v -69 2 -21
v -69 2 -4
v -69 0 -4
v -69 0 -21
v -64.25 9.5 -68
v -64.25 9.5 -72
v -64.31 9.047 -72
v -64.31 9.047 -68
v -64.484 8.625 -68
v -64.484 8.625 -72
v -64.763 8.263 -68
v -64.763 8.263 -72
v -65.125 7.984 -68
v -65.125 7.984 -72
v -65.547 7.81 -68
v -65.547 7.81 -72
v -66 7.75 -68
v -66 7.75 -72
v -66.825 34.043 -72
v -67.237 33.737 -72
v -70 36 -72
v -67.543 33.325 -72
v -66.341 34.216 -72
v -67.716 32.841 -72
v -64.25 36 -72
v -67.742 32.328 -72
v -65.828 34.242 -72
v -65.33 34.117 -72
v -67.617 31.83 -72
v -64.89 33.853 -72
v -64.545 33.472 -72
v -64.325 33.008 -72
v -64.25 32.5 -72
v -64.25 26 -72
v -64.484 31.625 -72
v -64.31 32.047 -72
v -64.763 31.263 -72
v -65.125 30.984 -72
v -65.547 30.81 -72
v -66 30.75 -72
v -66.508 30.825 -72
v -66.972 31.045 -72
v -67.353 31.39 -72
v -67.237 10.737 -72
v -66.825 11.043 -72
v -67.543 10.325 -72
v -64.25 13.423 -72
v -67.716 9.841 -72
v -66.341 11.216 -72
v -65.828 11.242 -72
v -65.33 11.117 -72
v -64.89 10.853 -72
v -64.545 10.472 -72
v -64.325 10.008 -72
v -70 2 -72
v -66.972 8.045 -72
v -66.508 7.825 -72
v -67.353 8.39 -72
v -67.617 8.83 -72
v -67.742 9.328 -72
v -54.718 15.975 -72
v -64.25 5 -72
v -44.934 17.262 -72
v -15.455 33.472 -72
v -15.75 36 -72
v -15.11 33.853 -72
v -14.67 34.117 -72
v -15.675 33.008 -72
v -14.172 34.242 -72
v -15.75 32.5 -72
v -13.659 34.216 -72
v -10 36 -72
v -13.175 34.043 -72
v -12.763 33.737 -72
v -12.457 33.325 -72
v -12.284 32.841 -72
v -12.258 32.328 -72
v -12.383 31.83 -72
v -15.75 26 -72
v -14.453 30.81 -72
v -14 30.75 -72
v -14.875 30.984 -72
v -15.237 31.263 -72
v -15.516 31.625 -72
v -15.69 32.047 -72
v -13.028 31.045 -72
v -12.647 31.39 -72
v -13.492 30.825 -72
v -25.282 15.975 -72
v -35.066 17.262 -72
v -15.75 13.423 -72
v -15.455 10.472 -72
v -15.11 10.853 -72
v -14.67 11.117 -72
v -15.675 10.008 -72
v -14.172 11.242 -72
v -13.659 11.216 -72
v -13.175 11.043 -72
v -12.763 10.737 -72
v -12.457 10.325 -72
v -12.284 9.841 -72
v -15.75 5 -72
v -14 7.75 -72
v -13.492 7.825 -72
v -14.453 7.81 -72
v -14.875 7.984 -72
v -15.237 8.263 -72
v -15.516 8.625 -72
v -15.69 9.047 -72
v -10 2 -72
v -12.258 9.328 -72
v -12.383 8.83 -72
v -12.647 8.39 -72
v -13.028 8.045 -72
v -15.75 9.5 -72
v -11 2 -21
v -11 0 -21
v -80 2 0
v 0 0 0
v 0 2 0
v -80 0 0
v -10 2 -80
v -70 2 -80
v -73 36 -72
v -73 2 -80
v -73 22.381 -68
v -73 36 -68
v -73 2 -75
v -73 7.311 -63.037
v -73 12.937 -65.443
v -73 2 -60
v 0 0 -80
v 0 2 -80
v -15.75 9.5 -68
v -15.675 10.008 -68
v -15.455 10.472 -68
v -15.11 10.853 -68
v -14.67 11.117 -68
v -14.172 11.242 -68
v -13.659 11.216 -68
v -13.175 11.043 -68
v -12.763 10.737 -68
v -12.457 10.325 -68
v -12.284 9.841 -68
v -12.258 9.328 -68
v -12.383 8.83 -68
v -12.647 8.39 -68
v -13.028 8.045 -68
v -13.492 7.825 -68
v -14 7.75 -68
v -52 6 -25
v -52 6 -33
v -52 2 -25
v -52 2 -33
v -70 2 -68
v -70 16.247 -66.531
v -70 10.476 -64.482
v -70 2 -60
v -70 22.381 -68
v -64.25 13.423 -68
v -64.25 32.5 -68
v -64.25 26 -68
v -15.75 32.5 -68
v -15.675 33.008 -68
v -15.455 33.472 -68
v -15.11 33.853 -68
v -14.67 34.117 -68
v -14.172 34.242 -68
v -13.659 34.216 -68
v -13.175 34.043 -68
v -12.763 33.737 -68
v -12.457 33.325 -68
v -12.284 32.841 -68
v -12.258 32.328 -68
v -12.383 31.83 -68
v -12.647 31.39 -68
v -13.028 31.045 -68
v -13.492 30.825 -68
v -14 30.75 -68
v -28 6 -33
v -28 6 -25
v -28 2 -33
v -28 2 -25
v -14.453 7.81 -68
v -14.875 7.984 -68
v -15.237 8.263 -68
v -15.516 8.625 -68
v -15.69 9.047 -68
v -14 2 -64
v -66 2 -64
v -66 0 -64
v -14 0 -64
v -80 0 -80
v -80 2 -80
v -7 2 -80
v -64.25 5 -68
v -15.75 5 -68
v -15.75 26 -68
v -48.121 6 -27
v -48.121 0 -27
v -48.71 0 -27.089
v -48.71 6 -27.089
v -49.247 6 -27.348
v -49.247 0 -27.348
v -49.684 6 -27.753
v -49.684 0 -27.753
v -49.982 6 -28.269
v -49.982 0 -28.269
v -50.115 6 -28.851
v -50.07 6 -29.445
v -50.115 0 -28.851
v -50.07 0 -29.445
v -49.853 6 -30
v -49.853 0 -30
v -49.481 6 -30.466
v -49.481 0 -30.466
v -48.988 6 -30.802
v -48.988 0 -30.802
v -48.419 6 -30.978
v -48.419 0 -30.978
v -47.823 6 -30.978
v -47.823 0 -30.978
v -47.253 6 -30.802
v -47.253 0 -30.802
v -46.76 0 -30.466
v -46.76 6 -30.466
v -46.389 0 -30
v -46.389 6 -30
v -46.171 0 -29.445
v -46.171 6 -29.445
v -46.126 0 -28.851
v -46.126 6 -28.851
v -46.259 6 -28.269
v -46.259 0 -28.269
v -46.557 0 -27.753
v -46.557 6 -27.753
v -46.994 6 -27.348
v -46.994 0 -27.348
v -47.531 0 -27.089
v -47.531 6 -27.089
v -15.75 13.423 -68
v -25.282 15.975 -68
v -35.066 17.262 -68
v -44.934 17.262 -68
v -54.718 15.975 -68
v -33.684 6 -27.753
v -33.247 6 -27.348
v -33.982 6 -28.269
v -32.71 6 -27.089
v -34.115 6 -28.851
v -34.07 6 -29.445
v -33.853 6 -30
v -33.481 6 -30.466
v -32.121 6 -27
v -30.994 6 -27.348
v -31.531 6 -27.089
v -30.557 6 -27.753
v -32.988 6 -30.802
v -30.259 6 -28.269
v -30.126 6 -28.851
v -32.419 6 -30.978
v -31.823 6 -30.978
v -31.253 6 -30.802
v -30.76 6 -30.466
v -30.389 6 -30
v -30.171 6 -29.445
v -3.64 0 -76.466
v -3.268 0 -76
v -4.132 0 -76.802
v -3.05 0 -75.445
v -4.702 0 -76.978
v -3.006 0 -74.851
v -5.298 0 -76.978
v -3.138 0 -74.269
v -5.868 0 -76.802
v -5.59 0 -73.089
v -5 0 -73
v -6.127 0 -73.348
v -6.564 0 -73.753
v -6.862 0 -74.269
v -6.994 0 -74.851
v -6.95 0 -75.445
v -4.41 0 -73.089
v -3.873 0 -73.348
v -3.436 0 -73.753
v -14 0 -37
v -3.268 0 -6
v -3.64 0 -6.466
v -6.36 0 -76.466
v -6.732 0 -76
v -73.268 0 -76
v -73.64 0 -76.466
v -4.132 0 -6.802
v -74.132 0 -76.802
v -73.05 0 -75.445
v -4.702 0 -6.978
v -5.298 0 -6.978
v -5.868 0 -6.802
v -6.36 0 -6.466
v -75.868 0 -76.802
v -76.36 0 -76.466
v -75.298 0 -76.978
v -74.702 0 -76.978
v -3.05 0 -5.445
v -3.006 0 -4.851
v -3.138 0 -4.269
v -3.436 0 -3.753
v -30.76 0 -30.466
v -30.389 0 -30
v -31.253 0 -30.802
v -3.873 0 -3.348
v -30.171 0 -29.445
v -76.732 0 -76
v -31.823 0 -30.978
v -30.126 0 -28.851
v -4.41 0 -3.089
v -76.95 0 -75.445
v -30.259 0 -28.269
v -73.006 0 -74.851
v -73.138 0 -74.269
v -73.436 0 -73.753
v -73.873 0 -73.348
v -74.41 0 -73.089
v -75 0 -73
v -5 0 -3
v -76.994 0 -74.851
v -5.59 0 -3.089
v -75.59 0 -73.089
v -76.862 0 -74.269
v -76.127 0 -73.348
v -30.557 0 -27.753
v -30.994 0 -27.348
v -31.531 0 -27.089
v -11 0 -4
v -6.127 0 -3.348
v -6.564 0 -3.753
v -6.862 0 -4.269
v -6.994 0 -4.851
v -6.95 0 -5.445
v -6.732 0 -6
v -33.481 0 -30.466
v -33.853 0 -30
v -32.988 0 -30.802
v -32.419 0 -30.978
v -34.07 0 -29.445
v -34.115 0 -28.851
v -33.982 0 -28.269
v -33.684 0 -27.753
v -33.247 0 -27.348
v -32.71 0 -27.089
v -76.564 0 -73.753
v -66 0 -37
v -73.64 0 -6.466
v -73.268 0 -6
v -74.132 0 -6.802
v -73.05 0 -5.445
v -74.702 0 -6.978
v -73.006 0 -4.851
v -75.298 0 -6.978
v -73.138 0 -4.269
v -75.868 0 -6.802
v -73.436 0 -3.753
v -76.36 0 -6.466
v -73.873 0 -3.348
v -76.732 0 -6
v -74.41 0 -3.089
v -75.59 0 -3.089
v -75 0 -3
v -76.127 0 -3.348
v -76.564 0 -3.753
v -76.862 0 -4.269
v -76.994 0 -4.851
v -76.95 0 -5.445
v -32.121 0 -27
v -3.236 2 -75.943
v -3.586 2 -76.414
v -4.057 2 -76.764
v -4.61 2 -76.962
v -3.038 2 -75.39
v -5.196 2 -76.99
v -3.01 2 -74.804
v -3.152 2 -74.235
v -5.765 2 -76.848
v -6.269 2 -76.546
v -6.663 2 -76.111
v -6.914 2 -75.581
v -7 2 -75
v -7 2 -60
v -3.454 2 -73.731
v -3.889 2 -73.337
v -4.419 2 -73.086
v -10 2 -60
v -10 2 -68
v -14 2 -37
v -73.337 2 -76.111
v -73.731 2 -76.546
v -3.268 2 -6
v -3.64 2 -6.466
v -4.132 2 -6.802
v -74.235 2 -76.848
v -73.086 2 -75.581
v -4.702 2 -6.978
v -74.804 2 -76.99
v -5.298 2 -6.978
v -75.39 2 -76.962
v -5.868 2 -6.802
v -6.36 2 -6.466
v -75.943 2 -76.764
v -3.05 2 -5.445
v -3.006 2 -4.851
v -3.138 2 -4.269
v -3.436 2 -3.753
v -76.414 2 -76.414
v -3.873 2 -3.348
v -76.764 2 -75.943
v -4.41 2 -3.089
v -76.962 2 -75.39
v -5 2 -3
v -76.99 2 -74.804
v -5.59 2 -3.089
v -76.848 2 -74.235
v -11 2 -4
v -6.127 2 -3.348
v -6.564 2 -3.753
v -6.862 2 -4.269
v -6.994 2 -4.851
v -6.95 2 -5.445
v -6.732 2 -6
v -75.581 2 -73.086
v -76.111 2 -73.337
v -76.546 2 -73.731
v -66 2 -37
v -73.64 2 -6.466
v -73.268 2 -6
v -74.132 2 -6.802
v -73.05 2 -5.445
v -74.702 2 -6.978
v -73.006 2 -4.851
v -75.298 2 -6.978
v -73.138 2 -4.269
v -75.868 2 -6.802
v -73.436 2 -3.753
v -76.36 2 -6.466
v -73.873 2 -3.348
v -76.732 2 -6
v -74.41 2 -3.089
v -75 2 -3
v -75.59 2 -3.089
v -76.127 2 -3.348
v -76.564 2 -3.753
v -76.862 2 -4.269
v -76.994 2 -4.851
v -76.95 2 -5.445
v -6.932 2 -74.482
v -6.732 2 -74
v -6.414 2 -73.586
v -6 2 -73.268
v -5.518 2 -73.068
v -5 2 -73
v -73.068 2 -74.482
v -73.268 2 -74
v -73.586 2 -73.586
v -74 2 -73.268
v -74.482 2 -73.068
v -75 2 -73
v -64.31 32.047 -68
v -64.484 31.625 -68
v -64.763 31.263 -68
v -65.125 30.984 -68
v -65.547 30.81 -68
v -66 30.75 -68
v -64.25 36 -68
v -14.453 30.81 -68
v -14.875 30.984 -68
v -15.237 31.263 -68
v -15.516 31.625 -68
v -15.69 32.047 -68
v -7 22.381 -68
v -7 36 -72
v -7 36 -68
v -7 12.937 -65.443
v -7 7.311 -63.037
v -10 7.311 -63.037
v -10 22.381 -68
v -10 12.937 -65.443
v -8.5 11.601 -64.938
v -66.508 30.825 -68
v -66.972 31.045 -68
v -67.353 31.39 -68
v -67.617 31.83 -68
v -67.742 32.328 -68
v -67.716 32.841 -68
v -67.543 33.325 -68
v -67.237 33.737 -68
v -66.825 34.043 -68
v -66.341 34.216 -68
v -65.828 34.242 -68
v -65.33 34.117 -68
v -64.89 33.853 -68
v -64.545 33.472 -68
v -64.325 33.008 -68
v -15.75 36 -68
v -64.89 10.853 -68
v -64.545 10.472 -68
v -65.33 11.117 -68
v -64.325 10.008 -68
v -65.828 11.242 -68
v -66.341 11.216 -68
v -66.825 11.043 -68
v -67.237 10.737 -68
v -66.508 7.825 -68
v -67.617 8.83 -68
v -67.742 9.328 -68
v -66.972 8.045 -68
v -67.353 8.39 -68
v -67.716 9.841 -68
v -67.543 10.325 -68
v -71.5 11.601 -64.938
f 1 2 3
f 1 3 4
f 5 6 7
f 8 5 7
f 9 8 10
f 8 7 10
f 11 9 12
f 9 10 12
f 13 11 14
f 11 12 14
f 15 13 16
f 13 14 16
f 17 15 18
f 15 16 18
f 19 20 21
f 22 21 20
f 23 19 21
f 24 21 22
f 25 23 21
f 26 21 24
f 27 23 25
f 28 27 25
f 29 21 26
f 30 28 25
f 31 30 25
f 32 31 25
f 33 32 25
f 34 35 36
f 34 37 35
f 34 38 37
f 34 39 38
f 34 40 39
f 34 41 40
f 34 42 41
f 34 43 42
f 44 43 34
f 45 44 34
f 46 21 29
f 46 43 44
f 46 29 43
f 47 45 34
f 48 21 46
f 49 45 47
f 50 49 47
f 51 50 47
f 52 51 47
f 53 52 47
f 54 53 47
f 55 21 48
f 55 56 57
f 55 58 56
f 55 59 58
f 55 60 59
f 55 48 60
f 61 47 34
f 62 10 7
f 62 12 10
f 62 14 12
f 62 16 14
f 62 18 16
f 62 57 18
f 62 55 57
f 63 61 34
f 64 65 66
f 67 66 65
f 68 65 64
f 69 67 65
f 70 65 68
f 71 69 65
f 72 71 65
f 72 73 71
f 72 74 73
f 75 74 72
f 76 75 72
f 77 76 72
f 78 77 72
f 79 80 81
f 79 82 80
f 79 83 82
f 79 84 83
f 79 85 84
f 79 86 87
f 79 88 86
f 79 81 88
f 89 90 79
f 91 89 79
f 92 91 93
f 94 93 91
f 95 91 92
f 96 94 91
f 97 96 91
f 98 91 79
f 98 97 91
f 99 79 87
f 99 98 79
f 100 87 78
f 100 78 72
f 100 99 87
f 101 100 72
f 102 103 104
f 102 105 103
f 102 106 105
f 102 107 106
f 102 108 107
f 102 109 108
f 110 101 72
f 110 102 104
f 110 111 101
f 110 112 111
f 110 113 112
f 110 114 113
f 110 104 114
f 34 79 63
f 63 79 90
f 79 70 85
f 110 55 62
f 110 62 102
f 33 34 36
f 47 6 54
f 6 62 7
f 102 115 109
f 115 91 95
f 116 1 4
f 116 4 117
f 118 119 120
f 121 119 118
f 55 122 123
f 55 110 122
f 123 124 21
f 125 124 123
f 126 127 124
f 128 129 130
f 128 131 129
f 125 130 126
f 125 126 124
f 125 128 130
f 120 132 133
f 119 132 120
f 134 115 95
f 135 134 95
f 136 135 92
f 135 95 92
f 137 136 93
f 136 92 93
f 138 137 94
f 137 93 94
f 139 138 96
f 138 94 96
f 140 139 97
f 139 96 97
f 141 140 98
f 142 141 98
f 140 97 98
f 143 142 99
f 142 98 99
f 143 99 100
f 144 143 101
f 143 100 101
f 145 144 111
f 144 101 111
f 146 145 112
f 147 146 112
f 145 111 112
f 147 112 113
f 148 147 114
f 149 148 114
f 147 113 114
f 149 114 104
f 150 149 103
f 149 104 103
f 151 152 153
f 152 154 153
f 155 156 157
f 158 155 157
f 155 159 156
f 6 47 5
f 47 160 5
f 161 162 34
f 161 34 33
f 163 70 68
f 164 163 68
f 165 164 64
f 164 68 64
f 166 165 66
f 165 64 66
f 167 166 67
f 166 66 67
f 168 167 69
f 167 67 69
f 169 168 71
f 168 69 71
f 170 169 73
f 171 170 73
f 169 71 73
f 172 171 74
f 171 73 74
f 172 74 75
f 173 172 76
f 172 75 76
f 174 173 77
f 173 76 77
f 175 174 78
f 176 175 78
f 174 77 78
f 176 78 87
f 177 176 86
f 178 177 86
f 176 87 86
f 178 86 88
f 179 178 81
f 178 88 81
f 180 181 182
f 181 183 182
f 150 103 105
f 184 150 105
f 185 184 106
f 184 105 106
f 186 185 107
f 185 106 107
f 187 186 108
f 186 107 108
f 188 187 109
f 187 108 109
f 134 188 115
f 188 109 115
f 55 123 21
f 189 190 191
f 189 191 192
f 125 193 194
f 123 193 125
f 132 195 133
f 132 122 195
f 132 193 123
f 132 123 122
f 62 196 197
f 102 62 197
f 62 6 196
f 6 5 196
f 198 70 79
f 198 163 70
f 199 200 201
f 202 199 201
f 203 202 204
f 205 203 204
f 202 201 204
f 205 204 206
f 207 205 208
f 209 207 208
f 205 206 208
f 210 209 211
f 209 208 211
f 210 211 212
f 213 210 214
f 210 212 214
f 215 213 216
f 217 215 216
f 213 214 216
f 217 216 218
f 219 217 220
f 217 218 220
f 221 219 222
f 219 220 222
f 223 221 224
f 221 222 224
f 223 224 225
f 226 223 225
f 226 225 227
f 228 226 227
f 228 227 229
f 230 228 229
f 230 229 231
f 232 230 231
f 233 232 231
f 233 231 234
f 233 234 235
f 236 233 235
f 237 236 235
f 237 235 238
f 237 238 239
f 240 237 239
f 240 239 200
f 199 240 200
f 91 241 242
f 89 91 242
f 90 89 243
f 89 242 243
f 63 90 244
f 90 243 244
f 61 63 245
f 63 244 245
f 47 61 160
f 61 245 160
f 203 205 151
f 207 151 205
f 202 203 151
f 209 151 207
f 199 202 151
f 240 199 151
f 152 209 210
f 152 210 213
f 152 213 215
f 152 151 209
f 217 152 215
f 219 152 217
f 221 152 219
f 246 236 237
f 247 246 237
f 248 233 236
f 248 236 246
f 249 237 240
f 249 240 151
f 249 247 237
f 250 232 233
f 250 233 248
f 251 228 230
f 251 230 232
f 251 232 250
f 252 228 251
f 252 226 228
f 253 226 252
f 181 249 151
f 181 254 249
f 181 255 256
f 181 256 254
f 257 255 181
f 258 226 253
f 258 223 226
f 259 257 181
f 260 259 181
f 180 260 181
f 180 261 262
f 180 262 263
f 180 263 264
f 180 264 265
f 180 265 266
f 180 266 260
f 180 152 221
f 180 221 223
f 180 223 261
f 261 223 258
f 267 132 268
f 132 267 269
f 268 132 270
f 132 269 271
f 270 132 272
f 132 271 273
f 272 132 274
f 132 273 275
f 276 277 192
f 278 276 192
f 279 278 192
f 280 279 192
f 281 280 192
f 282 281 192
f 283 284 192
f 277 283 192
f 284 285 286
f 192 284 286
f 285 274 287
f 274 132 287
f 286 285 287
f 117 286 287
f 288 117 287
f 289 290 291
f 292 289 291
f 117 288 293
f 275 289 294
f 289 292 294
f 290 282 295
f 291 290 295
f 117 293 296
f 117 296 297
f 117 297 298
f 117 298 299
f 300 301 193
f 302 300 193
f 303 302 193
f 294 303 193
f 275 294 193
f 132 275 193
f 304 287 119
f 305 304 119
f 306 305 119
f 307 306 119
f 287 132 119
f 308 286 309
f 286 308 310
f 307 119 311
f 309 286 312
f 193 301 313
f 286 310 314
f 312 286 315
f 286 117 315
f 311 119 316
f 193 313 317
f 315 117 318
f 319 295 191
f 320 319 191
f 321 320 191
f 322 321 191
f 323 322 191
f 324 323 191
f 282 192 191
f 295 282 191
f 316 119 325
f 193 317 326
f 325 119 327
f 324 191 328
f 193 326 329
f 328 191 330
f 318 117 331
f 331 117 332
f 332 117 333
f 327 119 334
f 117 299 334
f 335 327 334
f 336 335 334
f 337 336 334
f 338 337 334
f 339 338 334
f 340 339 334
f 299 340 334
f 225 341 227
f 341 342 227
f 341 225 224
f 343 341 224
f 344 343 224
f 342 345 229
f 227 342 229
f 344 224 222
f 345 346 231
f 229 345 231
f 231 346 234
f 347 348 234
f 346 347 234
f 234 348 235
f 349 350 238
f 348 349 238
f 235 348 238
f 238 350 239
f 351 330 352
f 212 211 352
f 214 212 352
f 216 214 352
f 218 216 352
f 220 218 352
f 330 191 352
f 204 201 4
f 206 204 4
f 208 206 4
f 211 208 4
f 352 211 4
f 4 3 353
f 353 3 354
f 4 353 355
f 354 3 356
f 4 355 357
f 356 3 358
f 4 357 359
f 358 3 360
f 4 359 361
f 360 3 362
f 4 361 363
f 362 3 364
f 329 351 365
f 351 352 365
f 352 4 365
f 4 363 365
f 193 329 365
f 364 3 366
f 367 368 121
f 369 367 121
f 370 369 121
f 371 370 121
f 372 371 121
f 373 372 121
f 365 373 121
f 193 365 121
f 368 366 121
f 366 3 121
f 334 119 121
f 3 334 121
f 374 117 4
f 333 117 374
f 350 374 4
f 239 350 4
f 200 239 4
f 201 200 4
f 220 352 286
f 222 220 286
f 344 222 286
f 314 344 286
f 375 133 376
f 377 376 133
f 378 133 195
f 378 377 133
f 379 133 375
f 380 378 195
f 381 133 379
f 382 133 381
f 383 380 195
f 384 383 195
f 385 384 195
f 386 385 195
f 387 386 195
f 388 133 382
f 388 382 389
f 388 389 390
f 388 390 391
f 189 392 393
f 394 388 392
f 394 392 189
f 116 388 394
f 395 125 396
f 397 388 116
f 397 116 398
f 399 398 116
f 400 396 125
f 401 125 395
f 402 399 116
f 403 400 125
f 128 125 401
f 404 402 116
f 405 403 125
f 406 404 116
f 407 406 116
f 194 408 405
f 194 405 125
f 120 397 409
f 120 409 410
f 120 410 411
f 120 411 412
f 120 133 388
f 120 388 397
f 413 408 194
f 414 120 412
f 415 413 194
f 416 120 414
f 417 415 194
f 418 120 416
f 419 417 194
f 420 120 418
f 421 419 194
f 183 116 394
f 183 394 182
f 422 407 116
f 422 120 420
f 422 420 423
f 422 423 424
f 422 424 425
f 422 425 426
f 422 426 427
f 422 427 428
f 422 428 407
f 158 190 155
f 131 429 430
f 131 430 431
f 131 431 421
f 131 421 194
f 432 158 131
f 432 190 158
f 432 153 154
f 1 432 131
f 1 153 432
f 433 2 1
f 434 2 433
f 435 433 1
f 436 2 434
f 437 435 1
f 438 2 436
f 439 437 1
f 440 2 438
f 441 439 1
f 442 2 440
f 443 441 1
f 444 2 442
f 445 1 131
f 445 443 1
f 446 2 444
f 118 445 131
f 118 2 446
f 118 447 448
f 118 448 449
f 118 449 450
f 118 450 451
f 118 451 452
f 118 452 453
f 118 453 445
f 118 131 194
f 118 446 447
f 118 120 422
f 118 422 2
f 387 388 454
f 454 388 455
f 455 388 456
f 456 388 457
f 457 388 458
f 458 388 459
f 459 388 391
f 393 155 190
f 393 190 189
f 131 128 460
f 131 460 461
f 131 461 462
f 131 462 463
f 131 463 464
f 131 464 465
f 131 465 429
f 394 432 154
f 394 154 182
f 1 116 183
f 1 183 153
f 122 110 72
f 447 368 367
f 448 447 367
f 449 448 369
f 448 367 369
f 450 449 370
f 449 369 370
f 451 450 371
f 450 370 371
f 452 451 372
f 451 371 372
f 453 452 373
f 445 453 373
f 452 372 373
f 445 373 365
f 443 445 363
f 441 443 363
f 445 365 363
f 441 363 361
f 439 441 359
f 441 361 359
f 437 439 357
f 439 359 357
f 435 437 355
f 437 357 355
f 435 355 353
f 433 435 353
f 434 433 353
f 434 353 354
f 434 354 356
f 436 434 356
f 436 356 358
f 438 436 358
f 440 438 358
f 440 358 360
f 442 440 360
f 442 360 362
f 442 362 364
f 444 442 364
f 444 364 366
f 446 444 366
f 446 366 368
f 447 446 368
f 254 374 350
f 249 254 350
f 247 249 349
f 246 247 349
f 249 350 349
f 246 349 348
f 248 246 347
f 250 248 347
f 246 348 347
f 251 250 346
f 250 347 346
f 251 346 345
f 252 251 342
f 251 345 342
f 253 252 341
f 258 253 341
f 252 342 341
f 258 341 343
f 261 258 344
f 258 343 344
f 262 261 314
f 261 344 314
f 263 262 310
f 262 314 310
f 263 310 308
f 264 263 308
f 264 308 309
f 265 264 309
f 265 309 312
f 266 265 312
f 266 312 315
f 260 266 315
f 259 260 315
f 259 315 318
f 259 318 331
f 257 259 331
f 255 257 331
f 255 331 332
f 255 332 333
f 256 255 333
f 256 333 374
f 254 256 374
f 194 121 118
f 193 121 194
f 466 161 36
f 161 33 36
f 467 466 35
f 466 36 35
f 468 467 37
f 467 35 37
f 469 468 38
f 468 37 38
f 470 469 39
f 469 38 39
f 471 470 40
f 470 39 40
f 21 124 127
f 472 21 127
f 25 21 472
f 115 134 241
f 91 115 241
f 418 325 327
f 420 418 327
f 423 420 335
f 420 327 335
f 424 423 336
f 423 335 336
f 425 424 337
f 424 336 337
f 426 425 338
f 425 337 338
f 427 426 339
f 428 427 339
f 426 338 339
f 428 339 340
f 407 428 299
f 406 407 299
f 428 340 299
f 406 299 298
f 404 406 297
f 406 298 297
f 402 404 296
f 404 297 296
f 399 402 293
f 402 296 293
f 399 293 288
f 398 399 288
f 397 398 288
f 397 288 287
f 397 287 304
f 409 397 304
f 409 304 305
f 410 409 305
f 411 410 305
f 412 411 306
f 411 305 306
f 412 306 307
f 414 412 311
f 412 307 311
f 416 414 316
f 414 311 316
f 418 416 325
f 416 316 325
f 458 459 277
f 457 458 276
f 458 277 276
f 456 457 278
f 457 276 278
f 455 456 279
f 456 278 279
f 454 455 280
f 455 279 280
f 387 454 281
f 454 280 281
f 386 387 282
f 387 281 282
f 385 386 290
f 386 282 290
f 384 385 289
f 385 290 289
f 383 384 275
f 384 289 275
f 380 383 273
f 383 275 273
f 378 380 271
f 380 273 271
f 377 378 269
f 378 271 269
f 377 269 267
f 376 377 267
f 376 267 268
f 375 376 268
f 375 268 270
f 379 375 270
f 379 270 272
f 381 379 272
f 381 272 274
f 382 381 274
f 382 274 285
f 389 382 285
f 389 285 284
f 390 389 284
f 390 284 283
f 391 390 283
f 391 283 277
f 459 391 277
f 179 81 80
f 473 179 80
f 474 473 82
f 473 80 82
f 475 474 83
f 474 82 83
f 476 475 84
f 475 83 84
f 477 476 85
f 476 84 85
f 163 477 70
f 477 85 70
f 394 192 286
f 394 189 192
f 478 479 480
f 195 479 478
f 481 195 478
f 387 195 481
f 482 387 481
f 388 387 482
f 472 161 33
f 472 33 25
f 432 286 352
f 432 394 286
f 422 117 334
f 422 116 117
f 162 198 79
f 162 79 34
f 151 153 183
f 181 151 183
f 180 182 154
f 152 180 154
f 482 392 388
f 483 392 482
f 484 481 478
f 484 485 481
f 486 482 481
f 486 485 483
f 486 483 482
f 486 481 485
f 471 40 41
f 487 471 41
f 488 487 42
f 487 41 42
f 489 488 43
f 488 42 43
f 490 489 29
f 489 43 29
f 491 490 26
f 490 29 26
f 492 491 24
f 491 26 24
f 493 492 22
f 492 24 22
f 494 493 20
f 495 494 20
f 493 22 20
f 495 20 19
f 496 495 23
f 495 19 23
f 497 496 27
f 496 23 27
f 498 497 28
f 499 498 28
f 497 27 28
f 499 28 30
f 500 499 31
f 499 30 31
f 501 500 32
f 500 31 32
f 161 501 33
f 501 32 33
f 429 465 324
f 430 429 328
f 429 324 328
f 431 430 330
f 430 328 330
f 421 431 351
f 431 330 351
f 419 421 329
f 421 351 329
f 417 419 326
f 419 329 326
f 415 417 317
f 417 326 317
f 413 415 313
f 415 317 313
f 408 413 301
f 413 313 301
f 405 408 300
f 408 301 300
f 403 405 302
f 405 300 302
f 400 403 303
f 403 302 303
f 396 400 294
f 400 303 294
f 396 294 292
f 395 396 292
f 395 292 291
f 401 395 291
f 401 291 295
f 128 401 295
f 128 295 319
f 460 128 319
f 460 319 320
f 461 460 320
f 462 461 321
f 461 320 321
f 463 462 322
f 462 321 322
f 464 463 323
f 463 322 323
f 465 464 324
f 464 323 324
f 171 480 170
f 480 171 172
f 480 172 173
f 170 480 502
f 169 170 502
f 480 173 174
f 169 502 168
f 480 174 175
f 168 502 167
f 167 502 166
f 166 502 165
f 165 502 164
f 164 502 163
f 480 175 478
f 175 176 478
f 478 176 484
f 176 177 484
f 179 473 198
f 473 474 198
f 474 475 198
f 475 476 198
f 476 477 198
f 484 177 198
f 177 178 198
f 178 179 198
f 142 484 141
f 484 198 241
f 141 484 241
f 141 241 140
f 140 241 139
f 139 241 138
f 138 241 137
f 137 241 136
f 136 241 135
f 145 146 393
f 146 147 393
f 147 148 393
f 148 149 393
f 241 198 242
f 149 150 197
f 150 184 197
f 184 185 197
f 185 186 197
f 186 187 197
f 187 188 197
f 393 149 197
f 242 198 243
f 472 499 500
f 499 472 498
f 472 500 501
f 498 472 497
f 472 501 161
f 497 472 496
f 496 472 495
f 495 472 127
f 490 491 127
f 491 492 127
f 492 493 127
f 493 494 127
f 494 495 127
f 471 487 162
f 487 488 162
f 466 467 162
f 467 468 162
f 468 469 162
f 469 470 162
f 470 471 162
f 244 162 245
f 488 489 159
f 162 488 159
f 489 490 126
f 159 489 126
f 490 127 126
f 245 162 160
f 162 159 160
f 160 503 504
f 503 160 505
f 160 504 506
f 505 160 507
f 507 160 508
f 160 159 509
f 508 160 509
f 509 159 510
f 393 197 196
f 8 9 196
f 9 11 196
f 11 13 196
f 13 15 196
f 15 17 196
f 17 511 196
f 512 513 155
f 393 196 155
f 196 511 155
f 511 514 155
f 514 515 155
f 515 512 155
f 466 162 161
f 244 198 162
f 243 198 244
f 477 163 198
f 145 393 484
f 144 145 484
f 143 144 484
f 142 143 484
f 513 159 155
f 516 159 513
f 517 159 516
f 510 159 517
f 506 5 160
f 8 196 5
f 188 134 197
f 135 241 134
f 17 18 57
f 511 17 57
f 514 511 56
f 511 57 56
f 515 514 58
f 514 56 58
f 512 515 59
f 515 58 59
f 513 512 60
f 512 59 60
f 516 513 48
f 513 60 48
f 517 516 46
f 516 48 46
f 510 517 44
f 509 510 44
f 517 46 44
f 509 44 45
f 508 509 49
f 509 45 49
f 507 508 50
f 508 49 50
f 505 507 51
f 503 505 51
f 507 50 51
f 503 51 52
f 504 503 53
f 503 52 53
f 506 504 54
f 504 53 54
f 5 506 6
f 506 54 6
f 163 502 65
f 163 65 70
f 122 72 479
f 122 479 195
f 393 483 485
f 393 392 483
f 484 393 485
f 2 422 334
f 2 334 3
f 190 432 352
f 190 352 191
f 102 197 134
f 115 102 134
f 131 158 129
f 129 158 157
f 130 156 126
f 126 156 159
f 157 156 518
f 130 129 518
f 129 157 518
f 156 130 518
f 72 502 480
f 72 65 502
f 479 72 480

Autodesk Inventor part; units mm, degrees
ref_plane "YZ Plane" through (0, 0, 0) normal (1, 0, 0) x (0, 1, 0)
ref_plane "XZ Plane" through (0, 0, 0) normal (0, 1, 0) x (-1, 0, 0)
ref_plane "XY Plane" through (0, 0, 0) normal (0, 0, 1) x (1, 0, 0)
sketch "Sketch1" plane through (0, 0, 0) normal (0, 1, 0) x (-1, 0, 0)
  line L0 (0, 0) -> (80, 0)
  line L1 (80, 0) -> (80, -80)
  line L2 (80, -80) -> (0, -80)
  line L3 (0, -80) -> (0, 0)
  line L4 (63.0847, -18.93) -> (13.0847, -18.93) construction
  line L5 (13.0847, -18.93) -> (13.0847, -23.93) construction
  line L6 (13.0847, -23.93) -> (63.0847, -23.93) construction
  line L7 (63.0847, -23.93) -> (63.0847, -18.93) construction
  line L8 (63.0847, -42.93) -> (13.0847, -42.93) construction
  line L9 (13.0847, -42.93) -> (13.0847, -47.93) construction
  line L10 (13.0847, -47.93) -> (63.0847, -47.93) construction
  line L11 (63.0847, -47.93) -> (63.0847, -42.93) construction
  line L12 (51.4414, -53.454) -> (27.4414, -53.454) construction
  line L13 (27.4414, -53.454) -> (27.4414, -61.454) construction
  line L14 (27.4414, -61.454) -> (51.4414, -61.454) construction
  line L15 (51.4414, -61.454) -> (51.4414, -53.454) construction
  circle A0 centre (48.4614, -57.454) radius 2 construction
  circle A1 centre (30.4614, -57.454) radius 2 construction
  dimension "d0" = 80
  dimension "d1" = 80
  dimension "d2" = 24
  dimension "d3" = 8
  dimension "d4" = 4
  dimension "d5" = 18
  dimension "d6" = 2.98
  dimension "d7" = 4
  dimension "d8" = 3.02
  dimension "d9" = 50
  dimension "d10" = 5
  dimension "d11" = 19
extrude "Extrusion1" add sketch "Sketch1" along normal blind 2
sketch "Sketch3" plane through (0, 2, 0) normal (0, 1, 0) x (1, 0, 0)
  circle A0 centre (-48.98, 29) radius 2 construction
  circle A1 centre (-30.98, 29) radius 2 construction
  line L0 (-28, 33) -> (-52, 33)
  line L1 (-52, 25) -> (-28, 25)
  line L2 (-28, 25) -> (-28, 33)
  line L3 (-52, 33) -> (-52, 25)
  line L4 (-80, 80) -> (-80, 0) construction
  line L5 (-80, 40) -> (0, 40) construction
  line L6 (0, 0) -> (0, 80) construction
  line L7 (0, 80) -> (-80, 80) construction
  line L8 (-40, 80) -> (-40, 0) construction
  line L9 (-80, 0) -> (0, 0) construction
  point P0 (-40, 33)
  dimension "d29" = 24
  dimension "d30" = 8
  dimension "d31" = 4
  dimension "d32" = 18
  dimension "d33" = 2.98
  dimension "d34" = 4
  dimension "d35" = 3.02
  dimension "d128" = 15
extrude "Extrusion3" add sketch "Sketch3" along normal blind 4
sketch "Sketch4" plane through (0, 2, 0) normal (0, 1, 0) x (1, 0, 0)
  point P0 (0, 0)
sketch "Sketch7" plane through (0, 2, 0) normal (0, 1, 0) x (1, 0, 0)
  line L0 (-5, 5) -> (-75, 5)
  line L1 (-75, 5) -> (-75, 75)
  line L2 (-75, 75) -> (-5, 75)
  line L3 (-5, 75) -> (-5, 5)
  line L4 (-80, 0) -> (0, 0) projected
  line L5 (0, 0) -> (0, 80) projected
  line L6 (-80, 80) -> (-80, 0) projected
  line L7 (0, 80) -> (-80, 80) projected
  dimension "d49" = 5
  dimension "d50" = 5
  dimension "d51" = 5
  dimension "d52" = 5
hole "Hole2" at (-5, 2, -5) at (-5, 2, -75) at (-75, 2, -75) at (-75, 2, -5) direction (0, -1, 0) diameter 4 end through all
sketch "Sketch10" plane through (0, 6, 0) normal (0, 1, 0) x (1, 0, 0)
  line L0 (-52, 33) -> (-52, 25) projected
  line L1 (-52, 29) -> (-29.1848, 29)
  point P0 (0, 0)
  point P1 (-48.1206, 29)
  point P2 (-32.1206, 29)
  dimension "d81" = 16
hole "Hole3" at (-48.1206, 6, -29) at (-32.1206, 6, -29) direction (0, -1, 0) diameter 4 end through all
sketch "Sketch20" plane through (0, 2, 0) normal (0, 1, 0) x (1, 0, 0)
  line L0 (-73, 80) -> (-70, 80) construction
  line L1 (-70, 60) -> (-73, 60) construction
  line L2 (-73, 60) -> (-73, 80) construction
  line L3 (-10, 60) -> (-7, 60) construction
  line L4 (-7, 60) -> (-7, 80) construction
  line L5 (-7, 80) -> (-10, 80) construction
  line L6 (-70, 60) -> (-73, 60)
  line L7 (-73, 60) -> (-73, 80)
  line L8 (-73, 80) -> (-70, 80)
  line L9 (-70, 80) -> (-70, 72)
  line L10 (-70, 72) -> (-10, 72)
  line L11 (-10, 72) -> (-10, 80)
  line L12 (-10, 80) -> (-7, 80)
  line L13 (-7, 80) -> (-7, 60)
  line L14 (-7, 60) -> (-10, 60)
  line L15 (-10, 60) -> (-10, 68)
  line L16 (-10, 68) -> (-70, 68)
  line L17 (-70, 68) -> (-70, 60)
  line L18 (-70, 60) -> (-73, 60)
  point P0 (0, 0)
  dimension "d132" = 3
  dimension "d133" = 20
extrude "Extrusion13" add sketch "Sketch20" along normal blind 34
sketch "Sketch21" plane through (-70, 2, -60) normal (1, 0, 0) x (0, 0, -1)
  line L0 (8, 0) -> (0, 0) construction
  line L1 (0, 0) -> (5.8768, 9.0116) construction
  line L2 (8, 0) -> (8, 34) construction
  line L3 (5.8768, 9.0116) -> (8, 20.3813) construction
  spline S0 degree 2 poles (0, 0) (5.8768, 9.0116) (8, 20.3813) knots 1 1 1 2 2 2
  line L4 (0, 0) -> (0, 34) projected
  line L5 (0, 0) -> (0, 34)
  line L6 (0, 34) -> (8, 34) projected
  line L7 (0, 34) -> (8, 34)
  line L8 (8, 34) -> (8, 20.3813)
  point P0 (-60, -2)
extrude "Extrusion14" cut sketch "Sketch21" along normal through all both and the other way through all
sketch "Sketch22" plane through (-70, 2, -72) normal (1, 0, 0) x (0, 0, -1)
  line L0 (0, 34) -> (8, 0)
  line L1 (8, 0) -> (8, 34)
  line L2 (0, 34) -> (8, 34) projected
  line L3 (8, 34) -> (0, 34)
  point P0 (-72, -2)
extrude "Extrusion15" cut sketch "Sketch22" along normal through all both and the other way through all
sketch "Sketch23" plane through (-70, 2, -68) normal (0, 0, 1) x (1, 0, 0)
  line L0 (4, 7.5) -> (56, 7.5)
  line L1 (56, 7.5) -> (56, 30.5)
  line L2 (56, 30.5) -> (4, 30.5)
  line L3 (4, 30.5) -> (4, 7.5)
  line L4 (4, 7.5) -> (56, 30.5)
  line L5 (56, 7.5) -> (4, 30.5)
  line L6 (30, 30.5) -> (30, 34) construction
  line L7 (-3, 34) -> (63, 34) construction
  line L8 (30, 7.5) -> (30, 4) construction
  line L9 (18, 4) -> (42, 4) projected
  point P0 (70, -2)
  point P1 (30, 19)
  dimension "d142" = 52
  dimension "d143" = 23
hole "Hole5" at (-14, 32.5, -68) at (-14, 9.5, -68) at (-66, 9.5, -68) at (-66, 32.5, -68) direction (0, 0, -1) diameter 3.5 end through all
sketch "Sketch24" plane through (-70, 2, -68) normal (0, 0, 1) x (1, 0, 0)
  line L0 (60, 34) -> (0, 34) construction
  line L1 (5.75, 34) -> (54.25, 34)
  line L2 (54.25, 34) -> (54.25, 24)
  line L3 (54.25, 24) -> (5.75, 24)
  line L4 (5.75, 24) -> (5.75, 34)
  circle A0 centre (4, 30.5) radius 1.75 construction
  circle A1 centre (56, 30.5) radius 1.75 construction
  point P0 (70, -2)
  dimension "d151" = 0
  dimension "d152" = 0
  dimension "d153" = 10
extrude "Extrusion16" cut sketch "Sketch24" against normal blind 34
sketch "Sketch25" plane through (-70, 2, -68) normal (0, 0, 1) x (1, 0, 0)
  line L0 (5.75, 3) -> (54.25, 3)
  line L1 (54.25, 3) -> (54.25, 11.4232)
  line L2 (54.25, 11.4232) -> (5.75, 11.4232) construction
  line L3 (5.75, 11.4232) -> (5.75, 3)
  line L4 (60, 0) -> (0, 0) construction
  circle A0 centre (4, 7.5) radius 1.75 construction
  circle A1 centre (56, 7.5) radius 1.75 construction
  arc A2 (54.25, 11.4232) -> (5.75, 11.4232) centre (30, -60.0846) ccw
  line L5 (30, 15.4232) -> (30, 11.4232) construction
  point P0 (70, -2)
  dimension "d156" = 3
  dimension "d157" = 8.4232
  dimension "d159" = 0
  dimension "d160" = 0
  dimension "d161" = 4
extrude "Extrusion17" cut sketch "Sketch25" against normal blind 34
sketch "Sketch26" plane through (0, 2, 0) normal (0, 1, 0) x (1, 0, 0)
  line L0 (-66, 64) -> (-14, 64)
  line L1 (-14, 64) -> (-14, 37)
  line L2 (-14, 37) -> (-66, 37)
  line L3 (-66, 37) -> (-66, 64)
  line L4 (-70, 68) -> (-70, 60) construction
  line L5 (-10, 60) -> (-10, 68) projected
  line L6 (-15.75, 68) -> (-64.25, 68) construction
  line L7 (-28, 33) -> (-52, 33) projected
  line L8 (-80, 0) -> (0, 0) construction
  dimension "d164" = 4
  dimension "d165" = 4
  dimension "d166" = 4
  dimension "d167" = 4
extrude "Extrusion18" cut sketch "Sketch26" against normal blind 34
sketch "Sketch27" plane through (0, 2, 0) normal (0, 1, 0) x (1, 0, 0)
  line L0 (-69, 21) -> (-11, 21)
  line L1 (-11, 21) -> (-11, 4)
  line L2 (-11, 4) -> (-69, 4)
  line L3 (-69, 4) -> (-69, 21)
  line L4 (-52, 25) -> (-28, 25) construction
  line L5 (-80, 0) -> (0, 0) construction
  circle A0 centre (-75, 5) radius 2 construction
  circle A1 centre (-5, 5) radius 2 construction
  dimension "d172" = 4
  dimension "d173" = 4
  dimension "d174" = 4
  dimension "d175" = 4
extrude "Extrusion19" cut sketch "Sketch27" against normal blind 34
properties part number "ProtoBoard"
